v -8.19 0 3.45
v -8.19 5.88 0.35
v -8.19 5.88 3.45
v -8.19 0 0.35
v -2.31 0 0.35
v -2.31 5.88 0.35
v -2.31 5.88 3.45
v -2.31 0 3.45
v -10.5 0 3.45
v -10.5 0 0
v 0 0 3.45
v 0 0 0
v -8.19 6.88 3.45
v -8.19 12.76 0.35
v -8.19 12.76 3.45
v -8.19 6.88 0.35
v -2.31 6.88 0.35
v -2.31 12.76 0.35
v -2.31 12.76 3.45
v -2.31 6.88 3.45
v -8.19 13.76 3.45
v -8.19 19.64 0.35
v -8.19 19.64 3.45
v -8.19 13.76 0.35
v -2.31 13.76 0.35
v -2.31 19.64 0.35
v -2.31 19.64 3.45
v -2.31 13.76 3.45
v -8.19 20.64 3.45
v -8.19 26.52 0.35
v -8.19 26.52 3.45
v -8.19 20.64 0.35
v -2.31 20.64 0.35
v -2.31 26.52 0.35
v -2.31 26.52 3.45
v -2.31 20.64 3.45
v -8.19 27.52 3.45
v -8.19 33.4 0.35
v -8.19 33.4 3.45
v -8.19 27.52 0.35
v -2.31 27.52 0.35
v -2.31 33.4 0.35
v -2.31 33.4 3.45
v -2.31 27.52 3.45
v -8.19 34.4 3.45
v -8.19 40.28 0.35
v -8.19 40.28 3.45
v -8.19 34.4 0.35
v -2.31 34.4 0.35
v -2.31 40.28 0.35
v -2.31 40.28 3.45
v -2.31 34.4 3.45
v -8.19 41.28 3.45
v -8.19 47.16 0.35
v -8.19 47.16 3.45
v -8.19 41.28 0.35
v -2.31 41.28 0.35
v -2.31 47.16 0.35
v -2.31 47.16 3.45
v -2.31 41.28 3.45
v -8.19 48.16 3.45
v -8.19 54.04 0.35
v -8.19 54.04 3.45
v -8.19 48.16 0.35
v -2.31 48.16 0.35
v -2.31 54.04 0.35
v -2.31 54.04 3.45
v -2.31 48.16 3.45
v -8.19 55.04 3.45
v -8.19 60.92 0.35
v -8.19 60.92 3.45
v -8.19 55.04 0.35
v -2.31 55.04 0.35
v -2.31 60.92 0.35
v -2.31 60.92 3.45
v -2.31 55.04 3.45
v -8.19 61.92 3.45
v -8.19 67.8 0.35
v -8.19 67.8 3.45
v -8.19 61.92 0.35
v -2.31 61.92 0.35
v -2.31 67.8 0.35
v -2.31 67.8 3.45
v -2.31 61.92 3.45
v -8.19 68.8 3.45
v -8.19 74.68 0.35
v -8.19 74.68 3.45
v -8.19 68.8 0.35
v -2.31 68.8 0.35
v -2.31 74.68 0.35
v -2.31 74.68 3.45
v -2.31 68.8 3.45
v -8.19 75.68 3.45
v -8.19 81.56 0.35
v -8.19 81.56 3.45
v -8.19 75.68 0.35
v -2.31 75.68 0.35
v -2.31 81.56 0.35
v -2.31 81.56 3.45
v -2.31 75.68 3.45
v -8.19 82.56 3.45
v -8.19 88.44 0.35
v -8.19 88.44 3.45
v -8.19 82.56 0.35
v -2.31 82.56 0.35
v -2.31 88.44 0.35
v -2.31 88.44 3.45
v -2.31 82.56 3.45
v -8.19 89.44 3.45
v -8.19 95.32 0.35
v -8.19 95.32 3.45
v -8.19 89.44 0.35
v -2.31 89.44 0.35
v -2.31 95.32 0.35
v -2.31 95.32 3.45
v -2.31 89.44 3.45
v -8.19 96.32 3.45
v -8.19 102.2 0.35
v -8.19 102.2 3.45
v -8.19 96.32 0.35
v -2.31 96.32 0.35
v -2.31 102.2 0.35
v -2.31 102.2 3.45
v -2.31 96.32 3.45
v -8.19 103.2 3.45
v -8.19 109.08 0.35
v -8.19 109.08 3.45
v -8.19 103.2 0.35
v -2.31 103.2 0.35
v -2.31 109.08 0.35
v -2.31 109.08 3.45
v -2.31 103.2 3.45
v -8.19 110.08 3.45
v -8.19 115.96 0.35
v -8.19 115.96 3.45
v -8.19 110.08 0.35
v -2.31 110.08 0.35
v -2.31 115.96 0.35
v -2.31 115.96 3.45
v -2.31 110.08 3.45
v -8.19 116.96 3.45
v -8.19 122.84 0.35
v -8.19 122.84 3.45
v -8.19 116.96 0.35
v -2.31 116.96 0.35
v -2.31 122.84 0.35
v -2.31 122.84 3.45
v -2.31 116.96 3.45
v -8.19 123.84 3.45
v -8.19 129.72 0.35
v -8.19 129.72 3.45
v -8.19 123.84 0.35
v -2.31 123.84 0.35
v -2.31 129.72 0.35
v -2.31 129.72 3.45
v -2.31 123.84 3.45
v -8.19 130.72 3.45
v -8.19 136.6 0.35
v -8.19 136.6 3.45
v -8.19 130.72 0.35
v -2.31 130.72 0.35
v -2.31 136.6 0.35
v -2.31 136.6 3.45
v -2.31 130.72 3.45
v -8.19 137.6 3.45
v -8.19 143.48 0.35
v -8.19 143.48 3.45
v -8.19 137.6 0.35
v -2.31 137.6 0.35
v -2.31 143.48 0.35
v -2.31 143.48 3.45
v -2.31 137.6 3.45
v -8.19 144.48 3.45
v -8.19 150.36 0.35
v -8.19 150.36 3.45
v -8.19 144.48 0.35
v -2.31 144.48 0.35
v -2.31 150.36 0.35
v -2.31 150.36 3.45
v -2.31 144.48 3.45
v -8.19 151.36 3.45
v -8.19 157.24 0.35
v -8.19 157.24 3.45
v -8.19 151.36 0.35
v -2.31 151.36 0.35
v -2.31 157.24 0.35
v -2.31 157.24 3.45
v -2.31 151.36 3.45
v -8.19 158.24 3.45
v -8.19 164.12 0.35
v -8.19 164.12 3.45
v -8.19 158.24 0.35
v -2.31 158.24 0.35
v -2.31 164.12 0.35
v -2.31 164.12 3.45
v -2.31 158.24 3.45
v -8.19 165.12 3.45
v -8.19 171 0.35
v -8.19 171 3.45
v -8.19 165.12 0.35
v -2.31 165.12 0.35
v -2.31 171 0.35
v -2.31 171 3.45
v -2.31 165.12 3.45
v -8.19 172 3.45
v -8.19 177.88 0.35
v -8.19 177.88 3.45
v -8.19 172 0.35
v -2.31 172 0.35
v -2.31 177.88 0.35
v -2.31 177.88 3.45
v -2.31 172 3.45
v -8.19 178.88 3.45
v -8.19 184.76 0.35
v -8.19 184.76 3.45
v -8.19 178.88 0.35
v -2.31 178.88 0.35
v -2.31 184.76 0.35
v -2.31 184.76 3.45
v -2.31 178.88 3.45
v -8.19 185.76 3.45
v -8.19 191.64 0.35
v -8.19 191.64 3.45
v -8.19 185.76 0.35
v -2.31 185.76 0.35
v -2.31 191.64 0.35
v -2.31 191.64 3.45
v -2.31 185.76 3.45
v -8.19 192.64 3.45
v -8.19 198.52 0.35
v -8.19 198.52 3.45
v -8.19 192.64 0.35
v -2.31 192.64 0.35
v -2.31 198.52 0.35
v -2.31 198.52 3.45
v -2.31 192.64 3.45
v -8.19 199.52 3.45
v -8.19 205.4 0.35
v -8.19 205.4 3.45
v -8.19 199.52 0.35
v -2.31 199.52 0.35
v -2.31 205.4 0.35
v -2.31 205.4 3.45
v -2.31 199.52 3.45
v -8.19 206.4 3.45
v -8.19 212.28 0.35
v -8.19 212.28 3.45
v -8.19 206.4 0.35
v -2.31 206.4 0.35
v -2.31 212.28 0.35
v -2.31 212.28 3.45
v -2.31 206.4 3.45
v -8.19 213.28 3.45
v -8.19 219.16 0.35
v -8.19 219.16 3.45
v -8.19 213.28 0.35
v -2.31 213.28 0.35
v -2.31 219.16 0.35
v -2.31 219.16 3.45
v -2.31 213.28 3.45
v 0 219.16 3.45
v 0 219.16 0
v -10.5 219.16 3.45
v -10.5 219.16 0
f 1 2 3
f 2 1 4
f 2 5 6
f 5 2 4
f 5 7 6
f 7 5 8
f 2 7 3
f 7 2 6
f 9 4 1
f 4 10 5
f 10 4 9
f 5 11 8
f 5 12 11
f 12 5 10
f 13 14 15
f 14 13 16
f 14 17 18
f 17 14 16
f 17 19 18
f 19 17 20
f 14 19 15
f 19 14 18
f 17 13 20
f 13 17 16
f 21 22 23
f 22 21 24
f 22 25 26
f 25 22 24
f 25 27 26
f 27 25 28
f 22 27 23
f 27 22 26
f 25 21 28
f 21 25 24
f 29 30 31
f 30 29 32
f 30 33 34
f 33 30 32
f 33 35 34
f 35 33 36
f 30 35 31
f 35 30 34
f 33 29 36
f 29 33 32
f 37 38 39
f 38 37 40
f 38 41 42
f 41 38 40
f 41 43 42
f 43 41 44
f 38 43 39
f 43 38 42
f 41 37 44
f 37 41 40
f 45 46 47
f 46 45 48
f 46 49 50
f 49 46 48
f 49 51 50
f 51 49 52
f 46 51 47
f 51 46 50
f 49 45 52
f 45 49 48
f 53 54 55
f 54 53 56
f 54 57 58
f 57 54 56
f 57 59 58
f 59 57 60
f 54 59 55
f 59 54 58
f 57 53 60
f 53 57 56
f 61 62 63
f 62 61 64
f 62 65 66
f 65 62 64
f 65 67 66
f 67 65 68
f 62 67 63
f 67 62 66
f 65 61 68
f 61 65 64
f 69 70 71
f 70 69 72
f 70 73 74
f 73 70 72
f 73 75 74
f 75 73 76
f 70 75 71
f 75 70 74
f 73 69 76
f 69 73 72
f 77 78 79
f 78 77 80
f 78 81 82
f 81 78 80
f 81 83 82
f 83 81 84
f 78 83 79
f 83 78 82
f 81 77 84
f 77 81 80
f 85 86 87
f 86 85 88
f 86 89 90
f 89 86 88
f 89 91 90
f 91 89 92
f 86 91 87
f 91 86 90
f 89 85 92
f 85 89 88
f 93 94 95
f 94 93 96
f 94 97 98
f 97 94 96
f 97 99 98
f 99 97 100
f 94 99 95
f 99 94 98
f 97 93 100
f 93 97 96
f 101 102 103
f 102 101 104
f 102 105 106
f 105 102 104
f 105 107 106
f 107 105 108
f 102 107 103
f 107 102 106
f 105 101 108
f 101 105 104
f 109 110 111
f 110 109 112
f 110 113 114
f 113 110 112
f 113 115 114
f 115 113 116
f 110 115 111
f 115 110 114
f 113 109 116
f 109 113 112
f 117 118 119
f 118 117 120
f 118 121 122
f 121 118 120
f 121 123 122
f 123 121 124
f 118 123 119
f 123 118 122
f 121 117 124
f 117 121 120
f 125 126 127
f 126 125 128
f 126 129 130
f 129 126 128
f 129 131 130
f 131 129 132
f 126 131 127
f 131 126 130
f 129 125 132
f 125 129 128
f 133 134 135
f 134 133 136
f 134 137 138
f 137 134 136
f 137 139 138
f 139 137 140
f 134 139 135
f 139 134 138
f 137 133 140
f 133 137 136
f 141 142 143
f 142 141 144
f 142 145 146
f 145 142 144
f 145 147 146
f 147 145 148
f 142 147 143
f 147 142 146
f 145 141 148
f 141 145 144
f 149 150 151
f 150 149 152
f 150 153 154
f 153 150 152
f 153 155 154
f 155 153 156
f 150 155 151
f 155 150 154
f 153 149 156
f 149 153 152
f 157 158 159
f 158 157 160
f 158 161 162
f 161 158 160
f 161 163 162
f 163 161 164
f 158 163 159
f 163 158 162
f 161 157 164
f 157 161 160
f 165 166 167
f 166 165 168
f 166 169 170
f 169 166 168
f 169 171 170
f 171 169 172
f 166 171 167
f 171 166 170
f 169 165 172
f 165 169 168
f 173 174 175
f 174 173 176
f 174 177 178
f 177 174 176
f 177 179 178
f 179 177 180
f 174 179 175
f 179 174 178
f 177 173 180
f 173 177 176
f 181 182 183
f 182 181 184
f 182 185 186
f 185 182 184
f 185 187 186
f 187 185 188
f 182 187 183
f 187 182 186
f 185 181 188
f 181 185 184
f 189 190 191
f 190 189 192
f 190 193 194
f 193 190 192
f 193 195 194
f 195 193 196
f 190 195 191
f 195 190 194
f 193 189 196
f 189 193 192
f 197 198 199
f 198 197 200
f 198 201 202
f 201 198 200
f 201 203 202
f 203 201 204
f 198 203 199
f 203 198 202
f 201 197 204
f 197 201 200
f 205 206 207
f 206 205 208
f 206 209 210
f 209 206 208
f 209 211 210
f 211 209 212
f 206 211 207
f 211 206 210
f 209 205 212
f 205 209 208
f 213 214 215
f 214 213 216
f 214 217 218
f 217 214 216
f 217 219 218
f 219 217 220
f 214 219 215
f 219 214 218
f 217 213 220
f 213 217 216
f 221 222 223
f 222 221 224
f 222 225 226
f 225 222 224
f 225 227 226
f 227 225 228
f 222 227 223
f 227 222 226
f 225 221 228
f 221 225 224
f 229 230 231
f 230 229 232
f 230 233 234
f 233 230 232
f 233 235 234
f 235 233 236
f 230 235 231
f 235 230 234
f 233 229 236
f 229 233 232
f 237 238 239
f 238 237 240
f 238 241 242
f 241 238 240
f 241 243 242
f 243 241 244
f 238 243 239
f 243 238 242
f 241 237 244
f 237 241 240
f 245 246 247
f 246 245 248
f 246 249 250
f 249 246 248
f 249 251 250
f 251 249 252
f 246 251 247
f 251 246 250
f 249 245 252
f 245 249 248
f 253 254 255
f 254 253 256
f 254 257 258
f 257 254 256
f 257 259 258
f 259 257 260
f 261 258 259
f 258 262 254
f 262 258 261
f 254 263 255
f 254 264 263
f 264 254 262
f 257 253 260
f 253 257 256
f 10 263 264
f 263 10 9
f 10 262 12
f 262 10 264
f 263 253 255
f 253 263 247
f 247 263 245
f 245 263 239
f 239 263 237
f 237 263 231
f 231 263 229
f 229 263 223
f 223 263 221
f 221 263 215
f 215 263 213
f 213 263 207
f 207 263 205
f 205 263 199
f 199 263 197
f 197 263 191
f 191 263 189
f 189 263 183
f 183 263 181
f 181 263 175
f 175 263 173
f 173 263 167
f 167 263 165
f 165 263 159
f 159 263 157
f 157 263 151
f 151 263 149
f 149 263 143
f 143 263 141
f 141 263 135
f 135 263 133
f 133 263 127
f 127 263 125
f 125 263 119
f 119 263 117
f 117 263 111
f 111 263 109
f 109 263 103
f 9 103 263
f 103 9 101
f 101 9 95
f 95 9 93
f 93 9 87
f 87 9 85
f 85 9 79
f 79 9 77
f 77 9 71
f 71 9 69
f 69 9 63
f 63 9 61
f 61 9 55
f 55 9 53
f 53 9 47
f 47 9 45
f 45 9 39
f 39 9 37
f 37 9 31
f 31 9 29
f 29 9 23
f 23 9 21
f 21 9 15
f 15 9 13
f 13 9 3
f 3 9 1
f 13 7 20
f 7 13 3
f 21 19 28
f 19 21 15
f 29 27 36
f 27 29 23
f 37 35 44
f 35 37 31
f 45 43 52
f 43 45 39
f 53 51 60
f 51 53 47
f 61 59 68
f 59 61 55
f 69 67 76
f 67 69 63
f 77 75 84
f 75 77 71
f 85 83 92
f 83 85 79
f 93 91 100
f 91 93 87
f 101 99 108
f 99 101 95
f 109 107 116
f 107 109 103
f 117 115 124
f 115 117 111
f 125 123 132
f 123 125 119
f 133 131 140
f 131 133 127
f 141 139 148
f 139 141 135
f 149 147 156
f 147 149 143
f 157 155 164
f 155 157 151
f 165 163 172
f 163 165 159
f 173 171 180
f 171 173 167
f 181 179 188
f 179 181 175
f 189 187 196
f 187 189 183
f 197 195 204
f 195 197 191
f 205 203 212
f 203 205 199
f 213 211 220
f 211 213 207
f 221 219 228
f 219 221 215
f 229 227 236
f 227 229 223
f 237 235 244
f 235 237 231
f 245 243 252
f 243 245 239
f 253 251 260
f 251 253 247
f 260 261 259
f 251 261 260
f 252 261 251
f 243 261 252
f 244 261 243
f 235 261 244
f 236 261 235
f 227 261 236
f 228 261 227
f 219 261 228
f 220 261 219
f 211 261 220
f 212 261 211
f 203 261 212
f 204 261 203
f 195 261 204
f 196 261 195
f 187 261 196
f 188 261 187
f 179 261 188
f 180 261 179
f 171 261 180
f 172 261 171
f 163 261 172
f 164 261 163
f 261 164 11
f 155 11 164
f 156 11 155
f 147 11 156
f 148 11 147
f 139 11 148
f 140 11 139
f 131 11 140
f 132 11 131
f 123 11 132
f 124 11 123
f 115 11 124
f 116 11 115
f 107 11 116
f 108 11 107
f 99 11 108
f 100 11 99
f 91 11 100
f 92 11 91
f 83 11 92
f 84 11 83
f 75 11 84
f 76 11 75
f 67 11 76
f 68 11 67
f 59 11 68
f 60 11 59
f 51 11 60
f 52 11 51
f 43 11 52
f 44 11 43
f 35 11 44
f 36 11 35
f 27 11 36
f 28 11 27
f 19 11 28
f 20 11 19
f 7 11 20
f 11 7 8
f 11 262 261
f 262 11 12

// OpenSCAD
leds=32;

// The dimensions here are super fiddly
pixel_size=[6.88, 6.88, 3.25];
pixel_wall=[1, 1, 0.20];
strip=[10.5, pixel_size[1] * leds - pixel_wall[1], pixel_size[2] + pixel_wall[2]];
housing=strip + [1, 1, 1];
smidge = 0.05;

print_diffuser();
//print_back();

module assembly() {
  color("red")
  translate([(housing[0]-strip[0])/2,0,(housing[2]-strip[2])+smidge*2])
    diffuser();
  translate([0,0,0])
  back();

}

module print_diffuser() {
  translate([0,0,strip[2]])
  rotate([180,0,180])
    diffuser();
}

module print_back() {
  back();
}

module diffuser() {
  difference() {
    cube(strip);
      for ( y = [ 0 : 1 : leds] )
        translate([(strip[0] - (pixel_size[0]-pixel_wall[0]))/2,y * pixel_size[1],-smidge])
          cube(pixel_size - pixel_wall + [0,0,smidge*2]);
  }
}

module back () {
difference() {
  cube(housing);
  translate([(housing[0] - strip[0])/2, 0, ((housing[2] - strip[2] )+ smidge)])
    cube(strip);
}
}
